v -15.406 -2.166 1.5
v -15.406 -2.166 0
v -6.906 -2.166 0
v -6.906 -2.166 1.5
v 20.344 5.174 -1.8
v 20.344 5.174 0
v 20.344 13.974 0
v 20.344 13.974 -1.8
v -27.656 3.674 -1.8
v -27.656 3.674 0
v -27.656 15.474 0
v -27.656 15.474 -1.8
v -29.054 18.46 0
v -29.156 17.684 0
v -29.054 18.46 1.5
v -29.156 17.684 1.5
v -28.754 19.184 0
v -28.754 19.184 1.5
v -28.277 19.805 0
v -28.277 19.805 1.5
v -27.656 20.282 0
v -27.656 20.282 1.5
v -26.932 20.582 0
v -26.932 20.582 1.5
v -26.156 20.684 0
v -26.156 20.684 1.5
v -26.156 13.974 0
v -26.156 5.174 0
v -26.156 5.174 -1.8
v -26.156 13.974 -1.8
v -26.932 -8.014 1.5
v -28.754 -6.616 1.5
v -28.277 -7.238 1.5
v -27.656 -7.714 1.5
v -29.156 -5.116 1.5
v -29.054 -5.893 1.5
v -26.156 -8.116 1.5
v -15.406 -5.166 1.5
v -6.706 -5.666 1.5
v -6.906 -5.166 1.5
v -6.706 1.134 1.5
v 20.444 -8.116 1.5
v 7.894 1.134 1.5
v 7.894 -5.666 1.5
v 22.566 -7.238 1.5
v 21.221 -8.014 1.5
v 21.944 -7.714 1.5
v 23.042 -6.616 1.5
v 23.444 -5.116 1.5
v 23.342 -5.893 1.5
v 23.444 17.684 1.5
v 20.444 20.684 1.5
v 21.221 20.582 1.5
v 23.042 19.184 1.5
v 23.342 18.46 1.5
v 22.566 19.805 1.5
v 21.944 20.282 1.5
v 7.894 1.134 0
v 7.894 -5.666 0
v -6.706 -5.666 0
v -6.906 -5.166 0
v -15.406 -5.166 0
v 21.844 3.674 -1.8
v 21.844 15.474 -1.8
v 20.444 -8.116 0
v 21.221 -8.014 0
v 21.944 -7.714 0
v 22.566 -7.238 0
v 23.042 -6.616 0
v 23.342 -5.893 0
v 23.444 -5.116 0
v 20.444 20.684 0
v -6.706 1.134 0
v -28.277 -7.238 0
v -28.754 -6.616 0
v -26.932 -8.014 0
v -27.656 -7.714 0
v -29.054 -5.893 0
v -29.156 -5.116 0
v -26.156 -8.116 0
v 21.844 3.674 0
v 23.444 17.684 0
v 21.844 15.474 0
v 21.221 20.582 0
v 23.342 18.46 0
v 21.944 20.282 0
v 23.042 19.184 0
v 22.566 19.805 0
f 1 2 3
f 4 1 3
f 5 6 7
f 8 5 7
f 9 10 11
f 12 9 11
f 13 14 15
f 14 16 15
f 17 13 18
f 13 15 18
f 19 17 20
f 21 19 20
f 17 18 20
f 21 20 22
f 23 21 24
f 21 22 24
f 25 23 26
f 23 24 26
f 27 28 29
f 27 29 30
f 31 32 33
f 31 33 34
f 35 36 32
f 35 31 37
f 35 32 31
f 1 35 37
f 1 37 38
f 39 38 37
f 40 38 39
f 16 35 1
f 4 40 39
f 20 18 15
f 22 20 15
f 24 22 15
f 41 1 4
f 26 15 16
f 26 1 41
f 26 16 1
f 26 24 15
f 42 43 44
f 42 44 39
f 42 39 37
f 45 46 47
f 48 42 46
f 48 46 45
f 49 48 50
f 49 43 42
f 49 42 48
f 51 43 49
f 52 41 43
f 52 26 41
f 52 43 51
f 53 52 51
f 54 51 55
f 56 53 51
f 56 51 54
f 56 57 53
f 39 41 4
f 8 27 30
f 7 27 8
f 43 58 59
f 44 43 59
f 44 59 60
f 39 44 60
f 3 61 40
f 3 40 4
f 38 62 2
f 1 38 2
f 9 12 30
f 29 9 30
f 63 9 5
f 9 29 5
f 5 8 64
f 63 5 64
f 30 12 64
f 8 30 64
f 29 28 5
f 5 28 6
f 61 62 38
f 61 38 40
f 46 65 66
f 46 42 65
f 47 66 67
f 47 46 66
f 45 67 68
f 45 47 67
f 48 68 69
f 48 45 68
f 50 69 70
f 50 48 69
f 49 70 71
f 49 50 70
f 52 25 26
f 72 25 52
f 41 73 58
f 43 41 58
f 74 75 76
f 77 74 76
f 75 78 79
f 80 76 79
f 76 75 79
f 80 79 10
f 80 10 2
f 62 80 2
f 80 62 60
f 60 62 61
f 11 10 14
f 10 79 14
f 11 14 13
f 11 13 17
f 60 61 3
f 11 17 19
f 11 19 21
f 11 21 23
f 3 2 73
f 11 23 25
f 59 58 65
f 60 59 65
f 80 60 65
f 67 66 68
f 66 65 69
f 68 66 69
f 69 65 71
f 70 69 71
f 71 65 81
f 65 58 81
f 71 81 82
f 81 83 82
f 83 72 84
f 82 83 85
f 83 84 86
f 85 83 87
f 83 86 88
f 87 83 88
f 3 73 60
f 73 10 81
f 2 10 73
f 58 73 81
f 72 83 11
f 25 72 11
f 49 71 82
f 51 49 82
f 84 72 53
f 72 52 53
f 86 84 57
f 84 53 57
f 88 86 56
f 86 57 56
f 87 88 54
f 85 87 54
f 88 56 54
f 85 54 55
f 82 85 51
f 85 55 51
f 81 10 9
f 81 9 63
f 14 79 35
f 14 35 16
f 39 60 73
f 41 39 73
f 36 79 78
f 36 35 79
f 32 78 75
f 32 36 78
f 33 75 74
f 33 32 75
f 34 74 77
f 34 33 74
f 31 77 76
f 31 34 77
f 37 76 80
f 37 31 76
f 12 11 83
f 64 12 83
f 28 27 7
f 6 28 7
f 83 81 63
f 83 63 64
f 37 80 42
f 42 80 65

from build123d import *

# Parameters (mm, degrees)
F0_W     = 52.6
F0_H     = 28.8
F0_W_2   = 49.5
F0_H_2   = 11.8
F0_W_3   = 48
F0_H_3   = 2.52
F0_W_4   = 46.5
F0_H_4   = 8.8
F0_W_5   = 8.5
F0_H_5   = 3
F0_W_6   = 46.4
F0_H_6   = 0.92
F1_DEPTH = 1.5
F2_DEPTH = 1.8
F3_R     = 3


with BuildPart() as f1:
    # F0 (on Top) → F1 (new body)
    with BuildSketch(Plane.XY):
        with Locations((-2.8558062509, 6.2837967607)):
            Rectangle(F0_W, F0_H)
        Polygon((-26.6058062509, -3.4749299184), (-22.0043773293, -3.4749299184), (-22.0043773293, 1.2337967607), (20.8956226707, 1.2337967607), (20.8956226707, -4.7466191463), (20.8941937491, -4.7466191463), (20.8941937491, -5.2662032393), (20.8941937491, -5.8827909378), (20.8941937491, -6.0662032393), (-26.6058062509, -6.0662032393), (-26.6058062509, -5.2662032393), align=None, mode=Mode.SUBTRACT)
        with Locations((-2.9058062509, 9.5737967607)):
            Rectangle(F0_W_2, F0_H_2, mode=Mode.SUBTRACT)
        with Locations((-2.6558062509, 17.6337967607)):
            Rectangle(F0_W_3, F0_H_3, mode=Mode.SUBTRACT)
        with Locations((-2.9058062509, 9.5737967607)):
            Rectangle(F0_W_2, F0_H_2)
        with Locations((-2.9058062509, 9.5737967607)):
            Rectangle(F0_W_4, F0_H_4, mode=Mode.SUBTRACT)
        with Locations((-2.9058062509, 9.5737967607)):
            Rectangle(F0_W_4, F0_H_4)
        Polygon((-22.0043773293, 1.2337967607), (-22.0043773293, -3.4749299184), (-26.6058062509, -3.4749299184), (-26.6058062509, -5.2662032393), (-26.6058062509, -6.0662032393), (20.8941937491, -6.0662032393), (20.8941937491, -5.8827909378), (20.8941937491, -5.2662032393), (20.8941937491, -4.7466191463), (20.8956226707, -4.7466191463), (20.8956226707, 1.2337967607), align=None)
        with Locations((-11.1558062509, -3.6662032393)):
            Rectangle(F0_W_5, F0_H_5, mode=Mode.SUBTRACT)
        Polygon((7.8941937491, 1.1337967607), (7.8941937491, -5.2662032393), (7.8941937491, -5.3662032393), (20.7941937491, -5.3662032393), (20.7941937491, -5.9662032393), (-26.5058062509, -5.9662032393), (-26.5058062509, -5.3662032393), (-6.7058062509, -5.3662032393), (-6.7058062509, -5.2662032393), (-6.7058062509, 1.1337967607), align=None, mode=Mode.SUBTRACT)
        with Locations((-2.6558062509, 17.6337967607)):
            Rectangle(F0_W_3, F0_H_3)
        with Locations((-2.6558062509, 17.6337967607)):
            Rectangle(F0_W_6, F0_H_6, mode=Mode.SUBTRACT)
        with Locations((-2.6558062509, 17.6337967607)):
            Rectangle(F0_W_6, F0_H_6)
        Polygon((20.7941937491, -5.3662032393), (7.8941937491, -5.3662032393), (7.8941937491, -5.6662032393), (-6.7058062509, -5.6662032393), (-6.7058062509, -5.3662032393), (-26.5058062509, -5.3662032393), (-26.5058062509, -5.9662032393), (20.7941937491, -5.9662032393), align=None)
    extrude(amount=F1_DEPTH)

    # F0 (on Top) → F2 (join)
    with BuildSketch(Plane.XY):
        with Locations((-2.9058062509, 9.5737967607)):
            Rectangle(F0_W_2, F0_H_2)
        with Locations((-2.9058062509, 9.5737967607)):
            Rectangle(F0_W_4, F0_H_4, mode=Mode.SUBTRACT)
    extrude(amount=-F2_DEPTH)

    # F3
    f3_edges = [f1.edges().sort_by_distance(p)[0] for p in [
        (23.444194, -8.116203, 0.75),
        (23.444194, 20.683797, 0.75),
        (-29.155806, 20.683797, 0.75),
        (-29.155806, -8.116203, 0.75),
    ]]
    fillet(f3_edges, radius=F3_R)


solid = f1.part
